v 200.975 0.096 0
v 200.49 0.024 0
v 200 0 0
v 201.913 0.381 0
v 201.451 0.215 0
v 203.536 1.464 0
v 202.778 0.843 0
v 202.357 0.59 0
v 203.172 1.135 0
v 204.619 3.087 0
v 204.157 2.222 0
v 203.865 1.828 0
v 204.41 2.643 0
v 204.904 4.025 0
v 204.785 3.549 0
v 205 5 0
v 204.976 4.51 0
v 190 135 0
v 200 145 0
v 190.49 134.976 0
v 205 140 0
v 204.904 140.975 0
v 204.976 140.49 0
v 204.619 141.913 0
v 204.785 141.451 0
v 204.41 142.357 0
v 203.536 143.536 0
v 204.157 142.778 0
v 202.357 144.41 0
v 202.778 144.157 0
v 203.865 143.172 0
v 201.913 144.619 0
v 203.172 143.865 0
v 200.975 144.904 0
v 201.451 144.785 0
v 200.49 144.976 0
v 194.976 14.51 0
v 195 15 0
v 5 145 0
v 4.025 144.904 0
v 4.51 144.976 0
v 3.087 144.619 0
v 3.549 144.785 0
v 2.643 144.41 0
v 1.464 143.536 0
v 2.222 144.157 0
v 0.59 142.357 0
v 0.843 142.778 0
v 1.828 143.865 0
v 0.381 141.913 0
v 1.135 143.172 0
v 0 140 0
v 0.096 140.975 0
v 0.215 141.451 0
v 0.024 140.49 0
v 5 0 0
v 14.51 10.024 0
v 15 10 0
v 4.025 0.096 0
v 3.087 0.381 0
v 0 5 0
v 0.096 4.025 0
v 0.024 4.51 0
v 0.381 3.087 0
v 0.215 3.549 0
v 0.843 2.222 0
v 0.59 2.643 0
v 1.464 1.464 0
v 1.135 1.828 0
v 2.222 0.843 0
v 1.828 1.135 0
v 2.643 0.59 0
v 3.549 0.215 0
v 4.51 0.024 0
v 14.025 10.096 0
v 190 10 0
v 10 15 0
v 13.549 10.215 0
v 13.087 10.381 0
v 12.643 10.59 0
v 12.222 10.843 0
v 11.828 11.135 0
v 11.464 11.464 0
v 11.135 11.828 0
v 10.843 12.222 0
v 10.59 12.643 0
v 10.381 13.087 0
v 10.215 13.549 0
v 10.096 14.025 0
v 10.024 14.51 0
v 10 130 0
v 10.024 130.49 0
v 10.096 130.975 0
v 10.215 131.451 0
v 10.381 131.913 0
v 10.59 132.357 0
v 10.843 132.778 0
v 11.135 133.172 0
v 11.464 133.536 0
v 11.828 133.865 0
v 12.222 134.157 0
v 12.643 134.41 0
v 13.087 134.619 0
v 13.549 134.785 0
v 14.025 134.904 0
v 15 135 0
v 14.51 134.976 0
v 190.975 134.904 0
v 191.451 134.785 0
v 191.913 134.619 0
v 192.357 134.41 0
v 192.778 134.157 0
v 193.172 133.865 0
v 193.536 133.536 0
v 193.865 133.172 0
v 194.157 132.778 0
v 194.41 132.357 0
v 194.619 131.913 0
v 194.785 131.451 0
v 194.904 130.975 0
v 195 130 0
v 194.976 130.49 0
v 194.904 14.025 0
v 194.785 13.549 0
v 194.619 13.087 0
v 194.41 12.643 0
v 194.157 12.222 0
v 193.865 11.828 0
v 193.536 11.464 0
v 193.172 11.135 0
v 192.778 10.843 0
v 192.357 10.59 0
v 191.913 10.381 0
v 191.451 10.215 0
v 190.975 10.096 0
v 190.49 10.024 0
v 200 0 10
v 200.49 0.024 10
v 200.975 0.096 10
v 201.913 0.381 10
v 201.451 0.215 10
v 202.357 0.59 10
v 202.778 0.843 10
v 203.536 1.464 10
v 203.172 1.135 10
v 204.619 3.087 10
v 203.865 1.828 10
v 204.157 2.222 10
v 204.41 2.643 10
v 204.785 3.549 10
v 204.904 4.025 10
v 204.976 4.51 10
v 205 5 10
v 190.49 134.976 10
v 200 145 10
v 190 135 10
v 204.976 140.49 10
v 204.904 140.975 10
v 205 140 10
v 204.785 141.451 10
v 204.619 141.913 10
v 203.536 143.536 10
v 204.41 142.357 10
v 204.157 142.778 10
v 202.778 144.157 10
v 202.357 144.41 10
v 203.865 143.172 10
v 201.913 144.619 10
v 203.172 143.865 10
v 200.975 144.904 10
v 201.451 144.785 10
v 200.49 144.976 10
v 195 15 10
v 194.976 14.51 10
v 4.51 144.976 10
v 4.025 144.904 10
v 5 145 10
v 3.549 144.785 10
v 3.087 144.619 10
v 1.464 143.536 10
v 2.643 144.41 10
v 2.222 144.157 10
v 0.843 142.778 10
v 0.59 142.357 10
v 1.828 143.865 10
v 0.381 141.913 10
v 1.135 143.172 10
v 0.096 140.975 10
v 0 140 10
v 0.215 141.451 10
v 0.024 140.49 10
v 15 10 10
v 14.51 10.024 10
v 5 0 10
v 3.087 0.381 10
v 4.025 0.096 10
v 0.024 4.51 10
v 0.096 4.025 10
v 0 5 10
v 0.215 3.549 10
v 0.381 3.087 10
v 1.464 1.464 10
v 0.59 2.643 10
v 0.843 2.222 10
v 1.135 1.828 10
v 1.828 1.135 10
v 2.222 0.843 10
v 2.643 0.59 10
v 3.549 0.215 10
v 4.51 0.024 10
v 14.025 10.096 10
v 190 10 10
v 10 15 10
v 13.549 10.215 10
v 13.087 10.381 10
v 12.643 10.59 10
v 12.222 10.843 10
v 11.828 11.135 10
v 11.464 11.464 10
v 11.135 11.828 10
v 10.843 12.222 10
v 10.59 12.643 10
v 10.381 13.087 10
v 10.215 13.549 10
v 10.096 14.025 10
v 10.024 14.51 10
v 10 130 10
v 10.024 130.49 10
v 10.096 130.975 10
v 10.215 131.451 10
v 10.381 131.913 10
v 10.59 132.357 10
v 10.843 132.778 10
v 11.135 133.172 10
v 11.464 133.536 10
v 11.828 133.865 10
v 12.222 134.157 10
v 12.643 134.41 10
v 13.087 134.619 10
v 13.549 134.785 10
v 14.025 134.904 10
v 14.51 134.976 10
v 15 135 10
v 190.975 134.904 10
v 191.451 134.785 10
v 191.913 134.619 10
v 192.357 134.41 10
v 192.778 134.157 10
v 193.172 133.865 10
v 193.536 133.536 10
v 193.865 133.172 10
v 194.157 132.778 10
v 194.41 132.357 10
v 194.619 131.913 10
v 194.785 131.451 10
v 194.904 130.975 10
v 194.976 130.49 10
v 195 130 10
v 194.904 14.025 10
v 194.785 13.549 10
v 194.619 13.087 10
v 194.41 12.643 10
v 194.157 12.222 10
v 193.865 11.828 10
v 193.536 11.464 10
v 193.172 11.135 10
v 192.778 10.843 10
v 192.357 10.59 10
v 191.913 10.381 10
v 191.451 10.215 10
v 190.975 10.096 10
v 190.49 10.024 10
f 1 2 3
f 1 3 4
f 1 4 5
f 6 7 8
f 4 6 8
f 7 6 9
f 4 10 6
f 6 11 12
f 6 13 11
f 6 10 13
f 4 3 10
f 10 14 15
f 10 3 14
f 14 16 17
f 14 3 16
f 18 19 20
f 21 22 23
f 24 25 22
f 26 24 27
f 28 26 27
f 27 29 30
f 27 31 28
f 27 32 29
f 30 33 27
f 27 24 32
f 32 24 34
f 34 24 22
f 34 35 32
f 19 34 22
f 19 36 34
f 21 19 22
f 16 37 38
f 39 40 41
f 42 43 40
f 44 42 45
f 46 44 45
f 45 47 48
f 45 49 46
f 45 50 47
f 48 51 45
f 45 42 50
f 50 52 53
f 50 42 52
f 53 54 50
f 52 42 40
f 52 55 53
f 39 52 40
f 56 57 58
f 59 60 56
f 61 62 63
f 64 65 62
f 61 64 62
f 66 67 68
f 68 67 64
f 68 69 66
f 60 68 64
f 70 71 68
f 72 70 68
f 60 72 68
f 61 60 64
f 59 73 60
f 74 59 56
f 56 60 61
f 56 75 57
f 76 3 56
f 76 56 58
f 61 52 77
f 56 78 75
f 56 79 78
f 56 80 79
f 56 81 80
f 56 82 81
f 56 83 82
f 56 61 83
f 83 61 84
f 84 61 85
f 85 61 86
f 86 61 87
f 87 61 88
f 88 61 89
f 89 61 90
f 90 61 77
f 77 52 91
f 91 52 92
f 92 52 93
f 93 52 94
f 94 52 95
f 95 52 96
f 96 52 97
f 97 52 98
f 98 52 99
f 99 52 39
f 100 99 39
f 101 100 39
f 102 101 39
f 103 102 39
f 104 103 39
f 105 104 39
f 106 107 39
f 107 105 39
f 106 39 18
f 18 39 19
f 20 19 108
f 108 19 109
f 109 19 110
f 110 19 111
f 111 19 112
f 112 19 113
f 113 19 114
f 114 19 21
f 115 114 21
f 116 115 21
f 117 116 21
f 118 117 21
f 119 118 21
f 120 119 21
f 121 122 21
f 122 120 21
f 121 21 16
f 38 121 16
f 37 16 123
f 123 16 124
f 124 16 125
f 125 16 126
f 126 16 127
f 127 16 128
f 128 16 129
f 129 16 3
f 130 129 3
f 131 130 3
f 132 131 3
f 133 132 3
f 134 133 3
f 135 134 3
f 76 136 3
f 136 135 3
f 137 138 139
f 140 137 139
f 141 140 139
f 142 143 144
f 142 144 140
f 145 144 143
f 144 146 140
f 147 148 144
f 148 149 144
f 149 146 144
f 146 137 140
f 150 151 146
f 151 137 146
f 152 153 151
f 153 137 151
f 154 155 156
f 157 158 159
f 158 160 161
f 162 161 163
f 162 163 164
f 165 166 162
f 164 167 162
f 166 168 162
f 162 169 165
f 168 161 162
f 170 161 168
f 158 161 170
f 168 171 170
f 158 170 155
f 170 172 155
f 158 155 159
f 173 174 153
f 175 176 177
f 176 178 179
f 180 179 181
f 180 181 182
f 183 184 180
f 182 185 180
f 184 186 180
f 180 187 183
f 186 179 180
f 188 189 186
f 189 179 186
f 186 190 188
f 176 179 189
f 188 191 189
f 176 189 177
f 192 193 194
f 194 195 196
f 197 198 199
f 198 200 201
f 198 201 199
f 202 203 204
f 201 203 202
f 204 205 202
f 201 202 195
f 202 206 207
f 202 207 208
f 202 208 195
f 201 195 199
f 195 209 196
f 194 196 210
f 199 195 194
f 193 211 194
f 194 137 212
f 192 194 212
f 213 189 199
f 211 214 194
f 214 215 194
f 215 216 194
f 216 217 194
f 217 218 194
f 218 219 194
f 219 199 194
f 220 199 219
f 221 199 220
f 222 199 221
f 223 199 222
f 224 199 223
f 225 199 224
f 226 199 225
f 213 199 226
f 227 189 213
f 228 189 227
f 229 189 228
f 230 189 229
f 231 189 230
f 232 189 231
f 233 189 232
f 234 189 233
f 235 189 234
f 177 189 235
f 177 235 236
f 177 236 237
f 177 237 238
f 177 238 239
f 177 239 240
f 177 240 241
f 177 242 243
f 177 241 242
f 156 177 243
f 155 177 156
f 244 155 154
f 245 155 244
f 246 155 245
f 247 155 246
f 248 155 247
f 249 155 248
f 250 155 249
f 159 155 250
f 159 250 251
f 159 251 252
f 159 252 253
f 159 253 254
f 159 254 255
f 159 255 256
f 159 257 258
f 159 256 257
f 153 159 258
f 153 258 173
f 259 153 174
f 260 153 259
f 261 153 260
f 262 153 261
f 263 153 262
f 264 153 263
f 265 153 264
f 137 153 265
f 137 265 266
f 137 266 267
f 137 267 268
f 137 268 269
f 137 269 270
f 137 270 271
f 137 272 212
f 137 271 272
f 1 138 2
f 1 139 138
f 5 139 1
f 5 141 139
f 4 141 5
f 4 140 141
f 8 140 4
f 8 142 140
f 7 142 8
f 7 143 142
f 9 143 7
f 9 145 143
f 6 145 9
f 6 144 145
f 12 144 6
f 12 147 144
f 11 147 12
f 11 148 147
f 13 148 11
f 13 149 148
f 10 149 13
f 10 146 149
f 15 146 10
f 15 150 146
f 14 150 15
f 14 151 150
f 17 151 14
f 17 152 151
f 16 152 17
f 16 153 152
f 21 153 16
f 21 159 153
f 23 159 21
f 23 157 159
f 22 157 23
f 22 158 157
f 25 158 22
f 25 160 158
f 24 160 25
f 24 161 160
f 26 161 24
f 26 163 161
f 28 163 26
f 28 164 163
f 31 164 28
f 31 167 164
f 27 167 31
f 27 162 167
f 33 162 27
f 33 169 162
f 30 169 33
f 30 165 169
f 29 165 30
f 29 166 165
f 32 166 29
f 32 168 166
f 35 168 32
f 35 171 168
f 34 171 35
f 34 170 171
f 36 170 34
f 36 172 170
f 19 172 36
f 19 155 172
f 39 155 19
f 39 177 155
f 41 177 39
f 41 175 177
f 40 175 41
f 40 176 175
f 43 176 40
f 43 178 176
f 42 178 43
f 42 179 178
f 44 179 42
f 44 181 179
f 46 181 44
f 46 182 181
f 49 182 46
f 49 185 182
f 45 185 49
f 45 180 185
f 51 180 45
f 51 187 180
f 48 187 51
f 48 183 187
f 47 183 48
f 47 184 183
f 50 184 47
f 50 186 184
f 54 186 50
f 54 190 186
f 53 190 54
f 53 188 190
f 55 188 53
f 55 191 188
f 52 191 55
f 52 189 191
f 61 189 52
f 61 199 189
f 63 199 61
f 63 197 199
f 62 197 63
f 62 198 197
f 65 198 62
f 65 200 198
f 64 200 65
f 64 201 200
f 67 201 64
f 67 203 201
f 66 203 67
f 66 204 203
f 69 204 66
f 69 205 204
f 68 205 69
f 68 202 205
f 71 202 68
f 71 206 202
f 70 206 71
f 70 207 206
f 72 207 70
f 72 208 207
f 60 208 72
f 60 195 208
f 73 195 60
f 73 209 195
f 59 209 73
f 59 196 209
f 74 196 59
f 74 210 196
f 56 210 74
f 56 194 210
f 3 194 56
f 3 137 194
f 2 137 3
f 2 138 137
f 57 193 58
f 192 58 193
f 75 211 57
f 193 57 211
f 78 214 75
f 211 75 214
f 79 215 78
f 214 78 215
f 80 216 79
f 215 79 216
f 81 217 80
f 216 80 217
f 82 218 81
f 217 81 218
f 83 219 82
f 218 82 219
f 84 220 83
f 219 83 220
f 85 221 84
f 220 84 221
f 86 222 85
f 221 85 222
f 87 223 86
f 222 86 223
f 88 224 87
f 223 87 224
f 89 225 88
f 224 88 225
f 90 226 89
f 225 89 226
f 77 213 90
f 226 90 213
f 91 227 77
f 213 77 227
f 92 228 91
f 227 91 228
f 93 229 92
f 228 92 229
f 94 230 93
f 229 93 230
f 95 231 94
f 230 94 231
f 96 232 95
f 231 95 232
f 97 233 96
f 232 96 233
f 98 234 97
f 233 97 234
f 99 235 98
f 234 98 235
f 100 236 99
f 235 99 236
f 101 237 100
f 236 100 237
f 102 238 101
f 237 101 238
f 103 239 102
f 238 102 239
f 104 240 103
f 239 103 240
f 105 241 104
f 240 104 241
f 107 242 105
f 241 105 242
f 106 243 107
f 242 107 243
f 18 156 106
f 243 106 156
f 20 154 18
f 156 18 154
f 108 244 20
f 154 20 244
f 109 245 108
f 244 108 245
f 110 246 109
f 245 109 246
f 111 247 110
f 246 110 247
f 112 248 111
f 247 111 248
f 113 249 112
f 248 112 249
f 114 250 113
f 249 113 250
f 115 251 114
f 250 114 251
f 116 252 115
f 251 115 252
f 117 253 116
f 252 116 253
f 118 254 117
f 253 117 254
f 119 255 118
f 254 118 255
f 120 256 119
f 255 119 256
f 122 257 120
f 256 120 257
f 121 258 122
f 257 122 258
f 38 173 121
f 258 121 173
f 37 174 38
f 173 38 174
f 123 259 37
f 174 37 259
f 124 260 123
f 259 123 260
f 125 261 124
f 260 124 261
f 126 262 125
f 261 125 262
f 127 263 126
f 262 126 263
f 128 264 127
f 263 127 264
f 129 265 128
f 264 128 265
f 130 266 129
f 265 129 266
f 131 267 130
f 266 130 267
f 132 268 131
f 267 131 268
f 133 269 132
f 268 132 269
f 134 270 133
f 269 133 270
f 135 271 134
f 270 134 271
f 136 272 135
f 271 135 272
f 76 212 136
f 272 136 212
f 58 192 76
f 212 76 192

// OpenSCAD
$fn = $preview ? 10 : 64;

module roundedsquare(size, radius) {
    if (radius == 0) {
        square(size);
    } else {
        hull() {
            translate([radius, radius]) circle(r=radius);
            translate([size[0]-radius, radius]) circle(r=radius);
            translate([radius, size[1]-radius]) circle(r=radius);
            translate([size[0]-radius, size[1]-radius]) circle(r=radius);
        }
    }
}

linear_extrude(10) {
    difference() {
        roundedsquare([205,145,10], 5);
        translate([10,10,0]) {
            roundedsquare([185,125,10], 5);
        }
    }
}
